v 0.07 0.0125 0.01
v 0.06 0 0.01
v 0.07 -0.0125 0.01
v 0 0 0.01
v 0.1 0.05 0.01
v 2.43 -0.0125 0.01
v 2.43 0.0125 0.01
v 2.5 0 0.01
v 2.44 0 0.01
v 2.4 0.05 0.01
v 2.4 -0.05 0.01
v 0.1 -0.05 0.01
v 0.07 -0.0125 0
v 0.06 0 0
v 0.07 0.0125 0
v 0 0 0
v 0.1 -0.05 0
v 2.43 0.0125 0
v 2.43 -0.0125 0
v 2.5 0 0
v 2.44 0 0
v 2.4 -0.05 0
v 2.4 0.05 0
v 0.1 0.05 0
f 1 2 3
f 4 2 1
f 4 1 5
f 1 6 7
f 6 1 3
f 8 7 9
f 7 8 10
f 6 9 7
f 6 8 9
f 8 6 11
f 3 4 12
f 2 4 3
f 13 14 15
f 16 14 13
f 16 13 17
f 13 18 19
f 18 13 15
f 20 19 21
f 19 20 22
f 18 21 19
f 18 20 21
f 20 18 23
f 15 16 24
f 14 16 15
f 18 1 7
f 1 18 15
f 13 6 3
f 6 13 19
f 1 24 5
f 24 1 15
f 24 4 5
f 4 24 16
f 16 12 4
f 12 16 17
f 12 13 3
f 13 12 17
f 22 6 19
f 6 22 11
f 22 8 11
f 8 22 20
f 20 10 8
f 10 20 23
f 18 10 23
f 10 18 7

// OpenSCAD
// file: ../drawing_sheet_sizes.scad
// drawing_sheet_sizes.scad
sheet_sizes = [
    // ISO 216 (A-Series)
    ["A0", [841, 1189]],
    ["A1", [594, 841]],
    ["A2", [420, 594]],
    ["A3", [297, 420]],
    ["A4", [210, 297]],

    // ANSI Standard (U.S.)
    ["ANSI_A", [216, 279]], // 8.5 × 11 inches
    ["ANSI_B", [279, 432]], // 11 × 17 inches
    ["ANSI_C", [432, 559]], // 17 × 22 inches
    ["ANSI_D", [559, 864]], // 22 × 34 inches
    ["ANSI_E", [864, 1118]], // 34 × 44 inches

    // Architectural Sizes (U.S.)
    ["ARCH_A", [229, 305]], // 9 × 12 inches
    ["ARCH_B", [305, 457]], // 12 × 18 inches
    ["ARCH_C", [457, 610]], // 18 × 24 inches
    ["ARCH_D", [610, 914]], // 24 × 36 inches
    ["ARCH_E", [914, 1219]], // 36 × 48 inches

    // ASME Y14.1 (Engineering Drawings)
    ["ENG_A", [216, 279]], // Same as ANSI A
    ["ENG_B", [279, 432]], // Same as ANSI B
    ["ENG_C", [432, 559]], // Same as ANSI C
    ["ENG_D", [559, 864]], // Same as ANSI D
    ["ENG_E", [864, 1118]], // Same as ANSI E

    // JIS B-Series (Japan)
    ["B0", [1030, 1456]],
    ["B1", [728, 1030]],
    ["B2", [515, 728]],
    ["B3", [364, 515]],
    ["B4", [257, 364]],
];
// file: ../src/dd_titleblock.scad
/**
 * @file dd_titleblock.scad
 * @brief Functions for creating title blocks on drawing sheets.
 * @details This file contains functions for creating title blocks on drawing sheets. The titleblock function creates a
 * title block with lines, descriptions, and details based on the given parameters.
 * @copyright (c) 2021 Don Smiley, (c) 2025 Cameron K. Brooks
 */

/*
 * titleblock(lines, descs, details, color, text_color)
 * Creates a title block for a drawing sheet, including lines, descriptions, and details.
 * Parameters:
 * - lines: Array defining the lines in the title block with format:
 *           [[startx, starty, orientation, length, width], ...]
 *           - orientation: Use DIM_HORZ or DIM_VERT for horizontal/vertical lines.
 *           - width: Factor to scale the line width beyond DIM_LINE_WIDTH.
 * - descs: Array defining descriptive text blocks with format:
 *           [[startx, starty, orientation, text, size], ...]
 *           - size: Factor to scale font size beyond DIM_FONTSCALE.
 * - details: Array defining part-specific details with format:
 *           [[startx, starty, orientation, text, size], ...]
 * - color: Line color.
 * - text_color: Text color.
 * Behavior:
 * - Draws lines and places text (descriptions and details) at specified positions.
 * - Handles horizontal and vertical orientations for text and lines.
 */
module titleblock(lines, descs, details, color = DEF_LINE_COLOR, text_color = DEF_TEXT_COLOR) {
    DIM_FONTSCALE = DIM_LINE_WIDTH * 0.7;

    for (line = lines)
    {
        color(color) translate([line[0] * DIM_LINE_WIDTH, line[1] * DIM_LINE_WIDTH, 0]) if (line[2] == DIM_VERT) {
                // a vertical line runs down from its start point, and line() draws upward
                translate([0, -line[3] * DIM_LINE_WIDTH, 0])
                    line(length=line[3] * DIM_LINE_WIDTH, width=DIM_LINE_WIDTH * line[4], vert=true);
            } else {
                line(length=(line[3] + 1) * DIM_LINE_WIDTH, width=DIM_LINE_WIDTH * line[4]);
            }
    }

    color(text_color) {
        for (line = descs)
        {
            translate([line[0] * DIM_LINE_WIDTH, line[1] * DIM_LINE_WIDTH, 0]) if (line[2] == DIM_VERT) {
                rotate([0, 0, 90])
                    linear_extrude(height=DIM_LINE_HEIGHT) scale([DIM_FONTSCALE * line[4], DIM_FONTSCALE * line[4]]) text(line[3]);
            } else {
                linear_extrude(height=DIM_LINE_HEIGHT) scale([DIM_FONTSCALE * line[4], DIM_FONTSCALE * line[4]]) text(line[3]);
            }
        }

        for (line = details)
        {
            translate([line[0] * DIM_LINE_WIDTH, line[1] * DIM_LINE_WIDTH, 0]) if (line[2] == DIM_VERT) {
                rotate([0, 0, 90])
                    linear_extrude(height=DIM_LINE_HEIGHT) scale([DIM_FONTSCALE * line[4], DIM_FONTSCALE * line[4]]) text(line[3]);
            } else {
                linear_extrude(height=DIM_LINE_HEIGHT) scale([DIM_FONTSCALE * line[4], DIM_FONTSCALE * line[4]]) text(line[3]);
            }
        }
    }
}
// file: ../src/dd_sheet.scad
/**
 * @file dd_sheet.scad
 * @brief Functions for drawing sheets from standard sizes and grid patterns.
 * @details This file contains functions for drawing sheets with standard sizes and grid patterns. The draw_sheet
 * function can draw a sheet boundary based on given dimensions or a standard sheet symbol with a grid or dot pattern.
 * @copyright (c) 2025 Cameron K. Brooks, (c) 2021 Don Smiley
 */

include <../drawing_sheet_sizes.scad>;

/*
 * draw_sheet(length, height, sheet_symbol, grid_type, line_width, color)
 * Draws a sheet boundary based on given dimensions or a standard sheet symbol and adds a grid or dot pattern if
 * specified. Parameters:
 * - length: Length of the sheet (overridden if sheet_symbol is provided).
 * - height: Height of the sheet (overridden if sheet_symbol is provided).
 * - sheet_symbol: Standard sheet size identifier (e.g., "A4", "ANSI_B").
 * - grid_type: "None", "Dot", or "Grid" to specify the background pattern.
 * - line_width: Thickness of the sheet boundary lines.
 * - color: Optional parameter to set the frame's color.
 */
module draw_sheet(
    length = undef,
    height = undef,
    sheet_symbol = undef,
    line_width = DIM_LINE_WIDTH * 2,
    line_height = DIM_LINE_HEIGHT,
    grid_type = "None",
    grid_dim = DIM_GRID_SPACING,
    grid_line_width = DIM_LINE_WIDTH,
    color = DEF_LINE_COLOR
) {
    // If a sheet symbol is provided, it overrides length and height using the sheet_sizes array.
    // An assignment inside an if block is local to that block, so the size is resolved here.
    matches = is_undef(sheet_symbol) ? [] : [for (sheet = sheet_sizes) if (sheet[0] == sheet_symbol) sheet[1]];
    sheet_length = len(matches) > 0 ? matches[0][0] : length;
    sheet_height = len(matches) > 0 ? matches[0][1] : height;

    if (!is_undef(sheet_symbol)) {
        echo("Looking for sheet symbol: ", sheet_symbol);

        if (len(matches) > 0) {
            echo("Match found for sheet symbol: ", sheet_symbol, " Dimensions: ", matches[0]);
        } else {
            echo("Warning: Sheet symbol '", sheet_symbol, "' not found.");
        }
    }

    // Proceed only if length and height are defined
    if (!is_undef(sheet_length) && !is_undef(sheet_height)) {
        // Draw the grid or dots before drawing the frame to ensure it's in the background
        draw_frame(sheet_length, sheet_height, line_width, line_height, color);
        translate([0, 0, -DIM_LINE_WIDTH])
            draw_grid(sheet_length, sheet_height, grid_type, grid_dim, grid_line_width, line_height, "lightgray");
    } else {
        echo("Warning: Invalid dimensions. Frame not drawn.");
    }
}

module draw_frame(length, height, line_width = DIM_LINE_WIDTH, line_height = DIM_LINE_HEIGHT, color = DEF_LINE_COLOR) {
    /*
     * draw_frame(length, height, line_width, color)
     * Draws the rectangular frame of a sheet with specified dimensions and line width.
     * Parameters:
     * - length: Length of the sheet frame.
     * - height: Height of the sheet frame.
     * - line_width: Thickness of the frame lines.
     * - color: Optional parameter to set the frame's color.
     * Behavior:
     * - Creates a rectangular frame with horizontal and vertical lines.
     */
    color(color) {
        // Bottom horizontal line
        line(length=length, width=line_width, height=line_height);

        // Top horizontal line
        translate([0, height, 0]) line(length=length, width=line_width, height=line_height);

        // Left vertical line
        translate([line_width / 2, line_width / 2, 0])
            line(length=height - line_width, width=line_width, height=line_height, vert=true);

        // Right vertical line
        translate([length - line_width / 2, line_width / 2, 0])
            line(length=height - line_width, width=line_width, height=line_height, vert=true);
    }
}

module draw_grid(
    length,
    height,
    type = "None",
    grid_spacing = DIM_GRID_SPACING,
    line_width = DIM_LINE_WIDTH / 2,
    line_height = DIM_LINE_HEIGHT,
    color = "lightgray"
) {
    /*
     * draw_grid(length, height, type, grid_spacing, line_width, color)
     * Adds a grid or dot pattern to the sheet.
     * Parameters:
     * - length: Length of the sheet.
     * - height: Height of the sheet.
     * - type: "None", "Dot", or "Grid" to specify the background pattern.
     * - grid_spacing: Distance between grid lines or dots.
     * - line_width: Thickness of grid lines (ignored for dots).
     * - color: Color of the grid lines or dots.
     */

    if (type == "Grid") {
        color(color) {
            // Draw vertical grid lines
            for (x = [0:grid_spacing:length])
            {
                translate([x, 0, 0]) line(length=height, width=line_width, height=line_height, vert=true);
            }

            // Draw horizontal grid lines
            for (y = [0:grid_spacing:height])
            {
                translate([0, y, 0]) line(
                        length=length, width=line_width, height=line_height,
                        left_arrow=false, right_arrow=false
                    );
            }
        }
    } else if (type == "Dot") {
        color(color) {
            // Define dot size
            dot_size = line_width; // You can adjust the dot size as needed

            for (x = [0:grid_spacing:length])
            {
                for (y = [0:grid_spacing:height])
                {
                    translate([x, y, 0]) sphere(r=dot_size, $fn=12);
                }
            }
        }
    } else {
        echo("No grid or dot pattern selected.");
    }
}
// file: ../dimdraft.scad
// ----- Variables -----
DOC_SCALING_FACTOR = is_undef(SCALING_FACTOR) ? 1 : SCALING_FACTOR;

// Line and text related constants

DIM_LINE_WIDTH_NOMINAL = 0.025; // Nominal line width
DIM_SPACE_NOMINAL = 0.1; // Nominal spacing value for line spacing adjustments
DIM_LINE_HEIGHT_NOMINAL = 0.01; // Nominal height of lines

DIM_LINE_WIDTH =
    is_undef(LINE_WIDTH) ? DIM_LINE_WIDTH_NOMINAL * DOC_SCALING_FACTOR : LINE_WIDTH; // Width of the dimension lines
DIM_LINE_HEIGHT =
    is_undef(HEIGHT) ? DIM_LINE_HEIGHT_NOMINAL * DOC_SCALING_FACTOR : HEIGHT; // Height of the dimension lines
DIM_SPACE =
    is_undef(SPACE) ? DIM_SPACE_NOMINAL * DOC_SCALING_FACTOR : SPACE; // Spacing value for line spacing adjustments

DEF_LINE_COLOR = is_undef(LINE_COLOR) ? "black" : LINE_COLOR; // Default line color
DEF_TEXT_COLOR = is_undef(TEXT_COLOR) ? "black" : TEXT_COLOR; // Default text color

// ----- Dependent Constants -----
// Hole center constant
DIM_HOLE_CENTER = DIM_LINE_WIDTH * 6; // Size of the cross within a circle
// Text is drawn at OpenSCAD's default size of 10 and scaled by DIM_FONTSCALE.
// Its height is 7 line widths unless TEXT_SIZE is set.
DIM_FONTSCALE = is_undef(TEXT_SIZE) ? DIM_LINE_WIDTH * 0.7 : TEXT_SIZE / 10;
DIM_TEXT_SIZE = DIM_FONTSCALE * 10; // Height of the text

DIM_GRID_SPACING = 50; // Default grid spacing value, standard for most drawings (i.e. ISO, ANSI, etc.)

// ----- Constants -----
// Dimension positioning constants
DIM_CENTER = 0;
DIM_LEFT = 1;
DIM_RIGHT = 2;
DIM_OUTSIDE = 3;

// Orientation constants
DIM_HORZ = 0;
DIM_VERT = 1;

// Corner positioning constants
DIM_UPPER_LEFT = 0;
DIM_UPPER_RIGHT = 1;
DIM_LOWER_LEFT = 2;
DIM_LOWER_RIGHT = 3;

// Offset value for hole length
ZFITE = 0.05; // Added to the hole length to extend past the surface of the cube

include <src/dd_dimlines.scad>;
include <src/dd_sheet.scad>;
include <src/dd_titleblock.scad>;
// main file
// An empty dimension label leaves the line unbroken: the right-hand half starts at the middle, 2.5 / 2.
// The pattern names the zero Y offset too: the label's own position, [1.25, -0.0525], is 1.25 either way.
// expect: \[1, 0, 0, 1\.25\], \[0, 1, 0, 0\]
// reject: 1\.3025
include <../dimdraft.scad>

dimensions(length=2.5, text="");
